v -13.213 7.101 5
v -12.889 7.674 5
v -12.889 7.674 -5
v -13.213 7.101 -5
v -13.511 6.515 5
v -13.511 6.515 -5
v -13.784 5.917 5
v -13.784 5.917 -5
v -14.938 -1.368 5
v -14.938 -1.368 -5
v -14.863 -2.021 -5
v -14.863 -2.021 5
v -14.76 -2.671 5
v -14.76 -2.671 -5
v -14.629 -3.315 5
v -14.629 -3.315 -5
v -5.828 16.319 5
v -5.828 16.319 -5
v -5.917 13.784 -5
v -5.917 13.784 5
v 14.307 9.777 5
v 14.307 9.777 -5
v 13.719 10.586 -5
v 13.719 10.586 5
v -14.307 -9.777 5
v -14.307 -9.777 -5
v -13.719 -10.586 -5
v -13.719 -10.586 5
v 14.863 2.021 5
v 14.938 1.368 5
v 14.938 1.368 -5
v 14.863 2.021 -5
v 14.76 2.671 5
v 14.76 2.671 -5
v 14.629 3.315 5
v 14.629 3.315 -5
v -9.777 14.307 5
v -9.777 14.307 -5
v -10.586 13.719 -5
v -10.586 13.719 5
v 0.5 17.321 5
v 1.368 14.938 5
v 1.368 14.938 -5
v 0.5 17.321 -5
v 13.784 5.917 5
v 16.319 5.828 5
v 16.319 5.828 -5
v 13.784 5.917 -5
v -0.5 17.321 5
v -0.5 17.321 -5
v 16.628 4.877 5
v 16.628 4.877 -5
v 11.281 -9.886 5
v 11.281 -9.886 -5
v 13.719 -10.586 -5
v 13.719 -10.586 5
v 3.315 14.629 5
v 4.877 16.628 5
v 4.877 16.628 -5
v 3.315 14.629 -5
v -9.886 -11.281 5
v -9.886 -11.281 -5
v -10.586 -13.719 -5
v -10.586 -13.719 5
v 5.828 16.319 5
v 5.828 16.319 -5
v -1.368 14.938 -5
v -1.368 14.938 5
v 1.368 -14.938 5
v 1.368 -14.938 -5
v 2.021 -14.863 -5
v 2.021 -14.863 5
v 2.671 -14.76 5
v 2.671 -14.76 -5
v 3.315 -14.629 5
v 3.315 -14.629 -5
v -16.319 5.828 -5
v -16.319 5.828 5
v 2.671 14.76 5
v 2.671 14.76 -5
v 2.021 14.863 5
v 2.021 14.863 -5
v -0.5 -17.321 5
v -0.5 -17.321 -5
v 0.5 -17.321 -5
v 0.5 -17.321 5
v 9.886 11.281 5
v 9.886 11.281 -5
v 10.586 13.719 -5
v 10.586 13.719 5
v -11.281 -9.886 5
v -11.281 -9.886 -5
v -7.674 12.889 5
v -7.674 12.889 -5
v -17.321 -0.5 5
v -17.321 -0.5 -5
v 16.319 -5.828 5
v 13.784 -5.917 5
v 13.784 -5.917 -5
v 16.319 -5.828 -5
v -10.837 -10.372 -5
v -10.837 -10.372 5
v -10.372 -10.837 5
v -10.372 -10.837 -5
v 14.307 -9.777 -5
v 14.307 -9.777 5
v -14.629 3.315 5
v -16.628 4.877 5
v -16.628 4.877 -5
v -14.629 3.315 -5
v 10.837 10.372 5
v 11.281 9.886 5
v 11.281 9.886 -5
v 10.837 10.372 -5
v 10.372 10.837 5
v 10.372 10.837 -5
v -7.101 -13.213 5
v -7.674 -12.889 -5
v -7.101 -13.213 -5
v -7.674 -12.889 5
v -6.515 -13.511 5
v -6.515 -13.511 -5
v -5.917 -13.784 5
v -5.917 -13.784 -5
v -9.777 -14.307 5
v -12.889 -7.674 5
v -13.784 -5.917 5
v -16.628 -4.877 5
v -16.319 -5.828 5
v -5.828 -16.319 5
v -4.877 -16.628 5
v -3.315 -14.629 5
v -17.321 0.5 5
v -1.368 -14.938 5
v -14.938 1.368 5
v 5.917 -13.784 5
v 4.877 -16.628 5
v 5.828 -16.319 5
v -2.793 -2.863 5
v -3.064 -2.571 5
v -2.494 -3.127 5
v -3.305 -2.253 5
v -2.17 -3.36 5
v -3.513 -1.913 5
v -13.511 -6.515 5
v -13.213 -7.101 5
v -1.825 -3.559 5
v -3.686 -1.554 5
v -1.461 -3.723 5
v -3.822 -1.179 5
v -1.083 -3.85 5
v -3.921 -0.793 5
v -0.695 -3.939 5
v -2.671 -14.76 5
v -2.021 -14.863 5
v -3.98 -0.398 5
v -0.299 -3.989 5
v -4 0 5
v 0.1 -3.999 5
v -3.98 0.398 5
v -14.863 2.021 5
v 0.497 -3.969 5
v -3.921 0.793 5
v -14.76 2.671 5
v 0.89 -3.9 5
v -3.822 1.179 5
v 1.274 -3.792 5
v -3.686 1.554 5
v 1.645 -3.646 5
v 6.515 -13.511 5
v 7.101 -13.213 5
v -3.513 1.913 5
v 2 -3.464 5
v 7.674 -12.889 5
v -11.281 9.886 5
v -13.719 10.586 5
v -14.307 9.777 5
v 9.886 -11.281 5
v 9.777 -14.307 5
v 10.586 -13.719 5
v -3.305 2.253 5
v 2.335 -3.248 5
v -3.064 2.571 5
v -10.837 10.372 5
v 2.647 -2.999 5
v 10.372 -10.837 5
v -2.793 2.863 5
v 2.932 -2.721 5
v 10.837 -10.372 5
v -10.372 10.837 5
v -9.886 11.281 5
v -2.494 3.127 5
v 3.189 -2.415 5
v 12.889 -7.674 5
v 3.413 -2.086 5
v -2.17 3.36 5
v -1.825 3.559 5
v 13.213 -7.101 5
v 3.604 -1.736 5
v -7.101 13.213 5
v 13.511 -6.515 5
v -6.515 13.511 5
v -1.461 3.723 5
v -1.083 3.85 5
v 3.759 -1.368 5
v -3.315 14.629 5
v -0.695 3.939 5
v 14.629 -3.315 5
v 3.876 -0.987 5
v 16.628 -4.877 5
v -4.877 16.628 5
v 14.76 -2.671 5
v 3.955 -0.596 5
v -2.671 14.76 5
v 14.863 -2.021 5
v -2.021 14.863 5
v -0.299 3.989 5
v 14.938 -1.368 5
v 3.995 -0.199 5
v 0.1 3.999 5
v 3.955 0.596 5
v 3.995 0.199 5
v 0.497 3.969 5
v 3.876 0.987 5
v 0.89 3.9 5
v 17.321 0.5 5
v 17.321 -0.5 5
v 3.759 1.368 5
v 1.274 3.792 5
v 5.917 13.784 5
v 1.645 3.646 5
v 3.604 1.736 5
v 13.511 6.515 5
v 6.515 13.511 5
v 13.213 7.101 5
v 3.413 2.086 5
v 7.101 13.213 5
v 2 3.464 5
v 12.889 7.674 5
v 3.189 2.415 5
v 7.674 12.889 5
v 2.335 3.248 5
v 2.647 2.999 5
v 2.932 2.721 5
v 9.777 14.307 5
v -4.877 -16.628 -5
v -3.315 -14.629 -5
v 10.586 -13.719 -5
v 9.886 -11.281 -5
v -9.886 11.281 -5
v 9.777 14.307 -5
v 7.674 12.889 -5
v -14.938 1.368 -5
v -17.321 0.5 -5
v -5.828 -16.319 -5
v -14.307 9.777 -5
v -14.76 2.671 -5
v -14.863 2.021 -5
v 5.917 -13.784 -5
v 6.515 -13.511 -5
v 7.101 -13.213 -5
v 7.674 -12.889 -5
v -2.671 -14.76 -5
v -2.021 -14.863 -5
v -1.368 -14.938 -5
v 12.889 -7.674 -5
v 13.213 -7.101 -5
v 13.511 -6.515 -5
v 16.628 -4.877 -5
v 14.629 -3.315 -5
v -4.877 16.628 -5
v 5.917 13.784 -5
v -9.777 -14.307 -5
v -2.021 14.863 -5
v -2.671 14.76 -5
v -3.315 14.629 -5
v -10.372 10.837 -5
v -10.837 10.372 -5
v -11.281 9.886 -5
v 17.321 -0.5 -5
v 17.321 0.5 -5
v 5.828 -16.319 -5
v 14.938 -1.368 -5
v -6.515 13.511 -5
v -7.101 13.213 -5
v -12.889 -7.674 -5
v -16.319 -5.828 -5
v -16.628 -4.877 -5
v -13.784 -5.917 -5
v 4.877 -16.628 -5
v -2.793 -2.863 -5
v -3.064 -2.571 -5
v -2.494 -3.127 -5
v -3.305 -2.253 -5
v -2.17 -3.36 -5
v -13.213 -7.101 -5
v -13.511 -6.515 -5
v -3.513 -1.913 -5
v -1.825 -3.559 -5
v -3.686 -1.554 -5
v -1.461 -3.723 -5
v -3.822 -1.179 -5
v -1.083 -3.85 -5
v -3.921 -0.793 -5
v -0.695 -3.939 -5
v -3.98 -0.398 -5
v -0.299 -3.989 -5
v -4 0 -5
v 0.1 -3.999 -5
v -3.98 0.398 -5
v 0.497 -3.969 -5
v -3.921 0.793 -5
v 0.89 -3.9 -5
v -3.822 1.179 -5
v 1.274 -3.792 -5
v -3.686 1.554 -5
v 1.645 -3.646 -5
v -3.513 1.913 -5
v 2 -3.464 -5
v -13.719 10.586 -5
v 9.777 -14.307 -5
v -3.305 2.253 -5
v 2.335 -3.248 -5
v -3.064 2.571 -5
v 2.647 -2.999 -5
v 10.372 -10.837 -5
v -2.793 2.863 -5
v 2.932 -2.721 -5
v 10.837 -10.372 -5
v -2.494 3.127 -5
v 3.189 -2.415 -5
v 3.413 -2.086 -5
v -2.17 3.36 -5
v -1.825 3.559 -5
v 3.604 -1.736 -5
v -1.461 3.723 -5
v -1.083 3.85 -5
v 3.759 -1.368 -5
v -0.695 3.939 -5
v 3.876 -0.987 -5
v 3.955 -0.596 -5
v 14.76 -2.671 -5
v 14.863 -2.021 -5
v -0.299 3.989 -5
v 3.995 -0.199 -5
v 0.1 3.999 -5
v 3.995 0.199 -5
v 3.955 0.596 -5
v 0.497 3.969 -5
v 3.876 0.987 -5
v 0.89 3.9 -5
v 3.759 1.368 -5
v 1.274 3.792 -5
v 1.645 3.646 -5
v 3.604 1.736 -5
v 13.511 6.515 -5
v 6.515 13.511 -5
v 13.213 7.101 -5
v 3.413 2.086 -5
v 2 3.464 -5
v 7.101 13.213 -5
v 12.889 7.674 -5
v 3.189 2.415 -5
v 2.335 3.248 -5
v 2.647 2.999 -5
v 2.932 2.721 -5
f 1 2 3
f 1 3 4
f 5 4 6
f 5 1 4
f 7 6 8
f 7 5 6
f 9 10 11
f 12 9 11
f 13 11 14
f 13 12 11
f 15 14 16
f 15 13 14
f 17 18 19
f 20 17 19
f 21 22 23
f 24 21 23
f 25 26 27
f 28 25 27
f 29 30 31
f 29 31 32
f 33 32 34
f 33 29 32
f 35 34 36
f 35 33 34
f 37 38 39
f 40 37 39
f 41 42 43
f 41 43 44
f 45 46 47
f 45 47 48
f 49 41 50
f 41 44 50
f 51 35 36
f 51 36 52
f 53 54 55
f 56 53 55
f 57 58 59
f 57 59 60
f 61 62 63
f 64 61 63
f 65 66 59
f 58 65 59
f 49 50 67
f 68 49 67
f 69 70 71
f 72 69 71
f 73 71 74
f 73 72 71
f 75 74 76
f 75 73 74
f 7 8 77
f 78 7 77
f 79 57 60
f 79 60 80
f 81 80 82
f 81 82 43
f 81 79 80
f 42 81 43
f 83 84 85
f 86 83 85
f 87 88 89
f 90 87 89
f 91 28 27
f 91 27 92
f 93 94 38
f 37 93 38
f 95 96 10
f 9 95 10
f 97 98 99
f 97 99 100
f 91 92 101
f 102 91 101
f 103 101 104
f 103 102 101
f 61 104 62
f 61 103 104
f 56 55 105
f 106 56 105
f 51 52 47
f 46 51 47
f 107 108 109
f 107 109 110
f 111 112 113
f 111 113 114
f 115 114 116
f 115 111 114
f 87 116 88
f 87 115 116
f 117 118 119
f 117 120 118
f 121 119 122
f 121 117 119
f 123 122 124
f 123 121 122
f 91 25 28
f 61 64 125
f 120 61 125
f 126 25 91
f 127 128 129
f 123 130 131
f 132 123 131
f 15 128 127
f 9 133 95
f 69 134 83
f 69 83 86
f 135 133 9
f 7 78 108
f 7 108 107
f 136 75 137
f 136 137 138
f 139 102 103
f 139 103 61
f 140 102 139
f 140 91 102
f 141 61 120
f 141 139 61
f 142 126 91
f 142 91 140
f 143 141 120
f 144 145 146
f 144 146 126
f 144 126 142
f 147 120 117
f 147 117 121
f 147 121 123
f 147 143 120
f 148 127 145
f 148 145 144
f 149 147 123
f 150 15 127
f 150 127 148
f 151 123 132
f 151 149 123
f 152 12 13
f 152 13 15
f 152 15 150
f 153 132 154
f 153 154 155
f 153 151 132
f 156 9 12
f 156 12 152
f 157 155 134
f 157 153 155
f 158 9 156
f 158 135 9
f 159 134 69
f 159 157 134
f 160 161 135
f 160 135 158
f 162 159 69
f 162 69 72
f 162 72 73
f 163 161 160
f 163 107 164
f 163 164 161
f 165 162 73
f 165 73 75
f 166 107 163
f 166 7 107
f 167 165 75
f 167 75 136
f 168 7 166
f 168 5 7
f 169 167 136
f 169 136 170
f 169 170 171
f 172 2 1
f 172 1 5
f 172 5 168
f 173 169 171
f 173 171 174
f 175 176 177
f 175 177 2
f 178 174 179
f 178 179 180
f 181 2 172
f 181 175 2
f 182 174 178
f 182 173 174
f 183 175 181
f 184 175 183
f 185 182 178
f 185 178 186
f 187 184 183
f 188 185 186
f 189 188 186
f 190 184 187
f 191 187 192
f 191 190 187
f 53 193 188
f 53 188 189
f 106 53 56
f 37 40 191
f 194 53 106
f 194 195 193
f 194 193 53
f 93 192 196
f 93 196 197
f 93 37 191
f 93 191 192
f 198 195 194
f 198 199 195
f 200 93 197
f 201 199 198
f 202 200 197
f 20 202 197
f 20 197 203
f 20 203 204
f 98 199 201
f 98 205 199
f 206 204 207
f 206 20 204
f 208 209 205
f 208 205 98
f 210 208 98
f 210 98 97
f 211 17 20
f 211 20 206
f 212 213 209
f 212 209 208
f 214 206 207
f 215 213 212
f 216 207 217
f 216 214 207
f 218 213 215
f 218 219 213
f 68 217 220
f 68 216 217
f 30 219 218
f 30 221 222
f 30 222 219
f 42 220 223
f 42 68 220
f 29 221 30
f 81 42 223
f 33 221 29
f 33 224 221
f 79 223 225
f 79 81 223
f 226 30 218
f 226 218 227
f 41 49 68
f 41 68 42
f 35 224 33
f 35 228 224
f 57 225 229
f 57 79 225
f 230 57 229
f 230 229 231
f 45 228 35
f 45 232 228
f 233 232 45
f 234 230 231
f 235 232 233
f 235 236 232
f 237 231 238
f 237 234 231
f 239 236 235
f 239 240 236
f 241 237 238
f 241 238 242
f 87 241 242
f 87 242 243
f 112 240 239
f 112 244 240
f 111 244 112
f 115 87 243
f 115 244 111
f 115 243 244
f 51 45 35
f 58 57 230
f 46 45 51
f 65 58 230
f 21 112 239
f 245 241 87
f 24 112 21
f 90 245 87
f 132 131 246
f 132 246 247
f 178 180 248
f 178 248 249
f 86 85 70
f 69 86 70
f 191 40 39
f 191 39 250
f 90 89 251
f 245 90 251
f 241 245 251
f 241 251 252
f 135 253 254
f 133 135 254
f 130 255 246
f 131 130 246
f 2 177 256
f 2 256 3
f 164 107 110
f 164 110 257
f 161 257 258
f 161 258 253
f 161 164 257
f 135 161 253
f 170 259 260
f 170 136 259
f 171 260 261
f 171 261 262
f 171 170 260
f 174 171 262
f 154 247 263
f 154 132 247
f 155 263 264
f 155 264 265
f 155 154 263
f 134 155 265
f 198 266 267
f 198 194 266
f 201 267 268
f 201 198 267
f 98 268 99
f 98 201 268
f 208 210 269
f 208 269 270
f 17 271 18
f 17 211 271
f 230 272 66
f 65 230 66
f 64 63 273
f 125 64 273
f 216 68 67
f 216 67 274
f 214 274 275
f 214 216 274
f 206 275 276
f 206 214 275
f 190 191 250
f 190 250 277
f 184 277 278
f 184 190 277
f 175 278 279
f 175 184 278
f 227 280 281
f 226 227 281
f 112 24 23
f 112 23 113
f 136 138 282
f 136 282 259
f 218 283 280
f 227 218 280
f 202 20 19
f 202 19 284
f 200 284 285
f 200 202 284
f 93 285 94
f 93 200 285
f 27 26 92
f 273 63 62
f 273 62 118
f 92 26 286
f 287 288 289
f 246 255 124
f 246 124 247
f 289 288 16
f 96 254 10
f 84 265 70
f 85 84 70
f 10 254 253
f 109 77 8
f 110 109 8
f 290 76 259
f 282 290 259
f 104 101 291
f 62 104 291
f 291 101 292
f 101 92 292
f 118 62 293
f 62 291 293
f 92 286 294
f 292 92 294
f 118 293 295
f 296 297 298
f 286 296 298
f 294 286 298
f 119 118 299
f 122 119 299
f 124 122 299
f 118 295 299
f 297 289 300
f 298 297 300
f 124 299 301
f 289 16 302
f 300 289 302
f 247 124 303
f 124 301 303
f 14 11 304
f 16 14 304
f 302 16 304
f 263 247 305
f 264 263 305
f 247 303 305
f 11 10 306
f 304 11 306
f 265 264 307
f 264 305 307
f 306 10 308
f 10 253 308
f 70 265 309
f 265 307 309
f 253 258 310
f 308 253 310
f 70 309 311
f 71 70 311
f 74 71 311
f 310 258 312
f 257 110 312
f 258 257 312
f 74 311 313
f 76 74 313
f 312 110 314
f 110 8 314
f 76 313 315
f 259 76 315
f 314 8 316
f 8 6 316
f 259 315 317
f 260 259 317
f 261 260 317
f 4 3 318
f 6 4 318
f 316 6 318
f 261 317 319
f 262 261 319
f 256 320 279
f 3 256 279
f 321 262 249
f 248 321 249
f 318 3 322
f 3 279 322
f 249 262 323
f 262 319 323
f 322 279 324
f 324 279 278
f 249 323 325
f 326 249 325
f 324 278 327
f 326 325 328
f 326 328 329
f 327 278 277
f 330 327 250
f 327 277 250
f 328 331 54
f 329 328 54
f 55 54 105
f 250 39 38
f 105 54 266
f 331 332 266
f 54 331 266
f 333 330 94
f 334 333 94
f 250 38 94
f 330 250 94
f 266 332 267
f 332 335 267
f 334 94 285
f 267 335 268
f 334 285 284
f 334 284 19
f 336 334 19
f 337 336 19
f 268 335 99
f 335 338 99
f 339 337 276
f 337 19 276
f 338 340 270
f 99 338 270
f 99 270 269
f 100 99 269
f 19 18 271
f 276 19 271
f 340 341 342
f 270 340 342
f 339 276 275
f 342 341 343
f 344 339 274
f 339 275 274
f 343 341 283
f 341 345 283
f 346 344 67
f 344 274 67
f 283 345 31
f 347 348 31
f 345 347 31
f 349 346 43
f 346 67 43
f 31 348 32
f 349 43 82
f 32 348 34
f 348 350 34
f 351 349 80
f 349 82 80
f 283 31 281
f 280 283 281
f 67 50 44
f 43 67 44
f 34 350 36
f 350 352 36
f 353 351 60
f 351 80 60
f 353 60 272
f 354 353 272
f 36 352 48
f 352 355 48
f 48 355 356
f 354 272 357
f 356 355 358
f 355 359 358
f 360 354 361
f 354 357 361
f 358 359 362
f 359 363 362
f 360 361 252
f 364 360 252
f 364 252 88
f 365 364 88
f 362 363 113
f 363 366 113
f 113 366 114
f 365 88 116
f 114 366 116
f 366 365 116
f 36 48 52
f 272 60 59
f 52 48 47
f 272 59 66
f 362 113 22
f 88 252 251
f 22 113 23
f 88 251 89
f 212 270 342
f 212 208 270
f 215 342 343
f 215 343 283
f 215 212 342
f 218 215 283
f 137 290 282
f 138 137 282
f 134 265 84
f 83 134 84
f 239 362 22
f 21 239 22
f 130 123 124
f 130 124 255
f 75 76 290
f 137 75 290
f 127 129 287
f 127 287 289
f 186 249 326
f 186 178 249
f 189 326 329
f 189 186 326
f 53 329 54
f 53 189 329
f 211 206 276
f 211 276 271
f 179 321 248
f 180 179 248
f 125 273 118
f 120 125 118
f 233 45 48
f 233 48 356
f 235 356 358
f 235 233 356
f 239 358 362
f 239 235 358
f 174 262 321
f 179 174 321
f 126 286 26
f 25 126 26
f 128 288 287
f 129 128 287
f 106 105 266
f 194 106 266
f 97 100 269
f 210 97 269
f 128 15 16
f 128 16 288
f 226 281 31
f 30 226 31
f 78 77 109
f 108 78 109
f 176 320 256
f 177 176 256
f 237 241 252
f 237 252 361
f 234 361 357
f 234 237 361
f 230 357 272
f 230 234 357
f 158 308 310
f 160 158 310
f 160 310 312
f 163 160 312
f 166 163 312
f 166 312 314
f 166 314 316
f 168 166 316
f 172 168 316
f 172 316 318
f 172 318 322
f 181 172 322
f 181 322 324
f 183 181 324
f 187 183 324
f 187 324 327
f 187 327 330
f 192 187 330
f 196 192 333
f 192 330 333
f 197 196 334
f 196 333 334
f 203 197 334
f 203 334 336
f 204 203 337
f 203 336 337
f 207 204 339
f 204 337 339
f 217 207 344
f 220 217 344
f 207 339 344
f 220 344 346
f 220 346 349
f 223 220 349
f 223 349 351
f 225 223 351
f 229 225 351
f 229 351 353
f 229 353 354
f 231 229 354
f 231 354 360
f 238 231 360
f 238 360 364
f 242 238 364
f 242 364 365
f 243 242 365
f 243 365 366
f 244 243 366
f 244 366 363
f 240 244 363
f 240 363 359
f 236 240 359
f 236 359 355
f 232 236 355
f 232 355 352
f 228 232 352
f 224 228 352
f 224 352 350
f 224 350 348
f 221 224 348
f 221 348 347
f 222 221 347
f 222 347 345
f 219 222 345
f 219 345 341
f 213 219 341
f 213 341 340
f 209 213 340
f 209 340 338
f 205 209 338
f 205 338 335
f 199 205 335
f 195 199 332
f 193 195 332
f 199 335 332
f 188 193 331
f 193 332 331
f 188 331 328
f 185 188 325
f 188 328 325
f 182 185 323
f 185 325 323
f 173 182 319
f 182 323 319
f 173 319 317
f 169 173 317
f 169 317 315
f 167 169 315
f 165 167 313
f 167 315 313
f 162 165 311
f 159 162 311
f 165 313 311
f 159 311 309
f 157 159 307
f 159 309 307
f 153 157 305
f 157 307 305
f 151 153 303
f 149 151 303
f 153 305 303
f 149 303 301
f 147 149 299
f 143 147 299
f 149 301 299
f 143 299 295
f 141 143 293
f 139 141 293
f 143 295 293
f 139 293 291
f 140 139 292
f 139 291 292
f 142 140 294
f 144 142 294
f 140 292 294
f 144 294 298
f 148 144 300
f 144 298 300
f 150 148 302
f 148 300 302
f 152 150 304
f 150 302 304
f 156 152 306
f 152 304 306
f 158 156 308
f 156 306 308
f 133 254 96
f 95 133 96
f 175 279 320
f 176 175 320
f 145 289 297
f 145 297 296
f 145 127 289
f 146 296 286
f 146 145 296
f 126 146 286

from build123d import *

# Parameters (mm, degrees)
IZIM1_R                     = 15
Y_KSEKLIK_EKSTR_ZYON1_DEPTH = 5
Y_KSEKLIK_EKSTR_ZYON2_DEPTH = 5
IZIM3_R                     = 4
KES_EKSTR_ZYON1_DEPTH       = 11


with BuildPart() as part:
    # Çizim1 → Yükseklik-Ekstrüzyon1 (new body, symmetric)
    with BuildSketch(Plane.XY):
        Circle(IZIM1_R)
    extrude(amount=Y_KSEKLIK_EKSTR_ZYON1_DEPTH, both=True)

    # Çizim2 → Yükseklik-Ekstrüzyon2 (add, symmetric)
    with BuildSketch(Plane.XY):
        Polygon((-2, 13.2), (2, 13.2), (0.5, 17.321216129), (-0.5, 17.321216129), align=None)
        Polygon((4.877021889, 16.627963967), (2.176911293, 13.171980004), (5.981137358, 11.935912026), (5.828078405, 16.318946973), align=None)
        Polygon((9.776646895, 14.307050838), (6.140731342, 11.85459483), (9.376799319, 9.503453821), (10.58566389, 13.719265586), align=None)
        Polygon((13.719265586, 10.58566389), (9.503453821, 9.376799319), (11.85459483, 6.140731342), (14.307050838, 9.776646895), align=None)
        Polygon((16.318946973, 5.828078405), (11.935912026, 5.981137358), (13.171980004, 2.176911293), (16.627963967, 4.877021889), align=None)
        Polygon((17.321216129, 0.5), (13.2, 2), (13.2, -2), (17.321216129, -0.5), align=None)
        Polygon((16.627963967, -4.877021889), (13.171980004, -2.176911293), (11.935912026, -5.981137358), (16.318946973, -5.828078405), align=None)
        Polygon((14.307050838, -9.776646895), (11.85459483, -6.140731342), (9.503453821, -9.376799319), (13.719265586, -10.58566389), align=None)
        Polygon((10.58566389, -13.719265586), (9.376799319, -9.503453821), (6.140731342, -11.85459483), (9.776646895, -14.307050838), align=None)
        Polygon((5.828078405, -16.318946973), (5.981137358, -11.935912026), (2.176911293, -13.171980004), (4.877021889, -16.627963967), align=None)
        Polygon((0.5, -17.321216129), (2, -13.2), (-2, -13.2), (-0.5, -17.321216129), align=None)
        Polygon((-4.877021889, -16.627963967), (-2.176911293, -13.171980004), (-5.981137358, -11.935912026), (-5.828078405, -16.318946973), align=None)
        Polygon((-9.776646895, -14.307050838), (-6.140731342, -11.85459483), (-9.376799319, -9.503453821), (-10.58566389, -13.719265586), align=None)
        Polygon((-13.719265586, -10.58566389), (-9.503453821, -9.376799319), (-11.85459483, -6.140731342), (-14.307050838, -9.776646895), align=None)
        Polygon((-16.318946973, -5.828078405), (-11.935912026, -5.981137358), (-13.171980004, -2.176911293), (-16.627963967, -4.877021889), align=None)
        Polygon((-17.321216129, -0.5), (-13.2, -2), (-13.2, 2), (-17.321216129, 0.5), align=None)
        Polygon((-16.627963967, 4.877021889), (-13.171980004, 2.176911293), (-11.935912026, 5.981137358), (-16.318946973, 5.828078405), align=None)
        Polygon((-14.307050838, 9.776646895), (-11.85459483, 6.140731342), (-9.503453821, 9.376799319), (-13.719265586, 10.58566389), align=None)
        Polygon((-10.58566389, 13.719265586), (-9.376799319, 9.503453821), (-6.140731342, 11.85459483), (-9.776646895, 14.307050838), align=None)
        Polygon((-5.828078405, 16.318946973), (-5.981137358, 11.935912026), (-2.176911293, 13.171980004), (-4.877021889, 16.627963967), align=None)
    extrude(amount=Y_KSEKLIK_EKSTR_ZYON2_DEPTH, both=True)

    # Çizim3 → Kes-Ekstrüzyon1 (cut, through all)
    with BuildSketch(Plane(origin=(0, 0, -5), x_dir=(-1, 0, 0), z_dir=(0, 0, -1))):
        Circle(IZIM3_R)
    extrude(amount=-KES_EKSTR_ZYON1_DEPTH, mode=Mode.SUBTRACT)


solid = part.part
